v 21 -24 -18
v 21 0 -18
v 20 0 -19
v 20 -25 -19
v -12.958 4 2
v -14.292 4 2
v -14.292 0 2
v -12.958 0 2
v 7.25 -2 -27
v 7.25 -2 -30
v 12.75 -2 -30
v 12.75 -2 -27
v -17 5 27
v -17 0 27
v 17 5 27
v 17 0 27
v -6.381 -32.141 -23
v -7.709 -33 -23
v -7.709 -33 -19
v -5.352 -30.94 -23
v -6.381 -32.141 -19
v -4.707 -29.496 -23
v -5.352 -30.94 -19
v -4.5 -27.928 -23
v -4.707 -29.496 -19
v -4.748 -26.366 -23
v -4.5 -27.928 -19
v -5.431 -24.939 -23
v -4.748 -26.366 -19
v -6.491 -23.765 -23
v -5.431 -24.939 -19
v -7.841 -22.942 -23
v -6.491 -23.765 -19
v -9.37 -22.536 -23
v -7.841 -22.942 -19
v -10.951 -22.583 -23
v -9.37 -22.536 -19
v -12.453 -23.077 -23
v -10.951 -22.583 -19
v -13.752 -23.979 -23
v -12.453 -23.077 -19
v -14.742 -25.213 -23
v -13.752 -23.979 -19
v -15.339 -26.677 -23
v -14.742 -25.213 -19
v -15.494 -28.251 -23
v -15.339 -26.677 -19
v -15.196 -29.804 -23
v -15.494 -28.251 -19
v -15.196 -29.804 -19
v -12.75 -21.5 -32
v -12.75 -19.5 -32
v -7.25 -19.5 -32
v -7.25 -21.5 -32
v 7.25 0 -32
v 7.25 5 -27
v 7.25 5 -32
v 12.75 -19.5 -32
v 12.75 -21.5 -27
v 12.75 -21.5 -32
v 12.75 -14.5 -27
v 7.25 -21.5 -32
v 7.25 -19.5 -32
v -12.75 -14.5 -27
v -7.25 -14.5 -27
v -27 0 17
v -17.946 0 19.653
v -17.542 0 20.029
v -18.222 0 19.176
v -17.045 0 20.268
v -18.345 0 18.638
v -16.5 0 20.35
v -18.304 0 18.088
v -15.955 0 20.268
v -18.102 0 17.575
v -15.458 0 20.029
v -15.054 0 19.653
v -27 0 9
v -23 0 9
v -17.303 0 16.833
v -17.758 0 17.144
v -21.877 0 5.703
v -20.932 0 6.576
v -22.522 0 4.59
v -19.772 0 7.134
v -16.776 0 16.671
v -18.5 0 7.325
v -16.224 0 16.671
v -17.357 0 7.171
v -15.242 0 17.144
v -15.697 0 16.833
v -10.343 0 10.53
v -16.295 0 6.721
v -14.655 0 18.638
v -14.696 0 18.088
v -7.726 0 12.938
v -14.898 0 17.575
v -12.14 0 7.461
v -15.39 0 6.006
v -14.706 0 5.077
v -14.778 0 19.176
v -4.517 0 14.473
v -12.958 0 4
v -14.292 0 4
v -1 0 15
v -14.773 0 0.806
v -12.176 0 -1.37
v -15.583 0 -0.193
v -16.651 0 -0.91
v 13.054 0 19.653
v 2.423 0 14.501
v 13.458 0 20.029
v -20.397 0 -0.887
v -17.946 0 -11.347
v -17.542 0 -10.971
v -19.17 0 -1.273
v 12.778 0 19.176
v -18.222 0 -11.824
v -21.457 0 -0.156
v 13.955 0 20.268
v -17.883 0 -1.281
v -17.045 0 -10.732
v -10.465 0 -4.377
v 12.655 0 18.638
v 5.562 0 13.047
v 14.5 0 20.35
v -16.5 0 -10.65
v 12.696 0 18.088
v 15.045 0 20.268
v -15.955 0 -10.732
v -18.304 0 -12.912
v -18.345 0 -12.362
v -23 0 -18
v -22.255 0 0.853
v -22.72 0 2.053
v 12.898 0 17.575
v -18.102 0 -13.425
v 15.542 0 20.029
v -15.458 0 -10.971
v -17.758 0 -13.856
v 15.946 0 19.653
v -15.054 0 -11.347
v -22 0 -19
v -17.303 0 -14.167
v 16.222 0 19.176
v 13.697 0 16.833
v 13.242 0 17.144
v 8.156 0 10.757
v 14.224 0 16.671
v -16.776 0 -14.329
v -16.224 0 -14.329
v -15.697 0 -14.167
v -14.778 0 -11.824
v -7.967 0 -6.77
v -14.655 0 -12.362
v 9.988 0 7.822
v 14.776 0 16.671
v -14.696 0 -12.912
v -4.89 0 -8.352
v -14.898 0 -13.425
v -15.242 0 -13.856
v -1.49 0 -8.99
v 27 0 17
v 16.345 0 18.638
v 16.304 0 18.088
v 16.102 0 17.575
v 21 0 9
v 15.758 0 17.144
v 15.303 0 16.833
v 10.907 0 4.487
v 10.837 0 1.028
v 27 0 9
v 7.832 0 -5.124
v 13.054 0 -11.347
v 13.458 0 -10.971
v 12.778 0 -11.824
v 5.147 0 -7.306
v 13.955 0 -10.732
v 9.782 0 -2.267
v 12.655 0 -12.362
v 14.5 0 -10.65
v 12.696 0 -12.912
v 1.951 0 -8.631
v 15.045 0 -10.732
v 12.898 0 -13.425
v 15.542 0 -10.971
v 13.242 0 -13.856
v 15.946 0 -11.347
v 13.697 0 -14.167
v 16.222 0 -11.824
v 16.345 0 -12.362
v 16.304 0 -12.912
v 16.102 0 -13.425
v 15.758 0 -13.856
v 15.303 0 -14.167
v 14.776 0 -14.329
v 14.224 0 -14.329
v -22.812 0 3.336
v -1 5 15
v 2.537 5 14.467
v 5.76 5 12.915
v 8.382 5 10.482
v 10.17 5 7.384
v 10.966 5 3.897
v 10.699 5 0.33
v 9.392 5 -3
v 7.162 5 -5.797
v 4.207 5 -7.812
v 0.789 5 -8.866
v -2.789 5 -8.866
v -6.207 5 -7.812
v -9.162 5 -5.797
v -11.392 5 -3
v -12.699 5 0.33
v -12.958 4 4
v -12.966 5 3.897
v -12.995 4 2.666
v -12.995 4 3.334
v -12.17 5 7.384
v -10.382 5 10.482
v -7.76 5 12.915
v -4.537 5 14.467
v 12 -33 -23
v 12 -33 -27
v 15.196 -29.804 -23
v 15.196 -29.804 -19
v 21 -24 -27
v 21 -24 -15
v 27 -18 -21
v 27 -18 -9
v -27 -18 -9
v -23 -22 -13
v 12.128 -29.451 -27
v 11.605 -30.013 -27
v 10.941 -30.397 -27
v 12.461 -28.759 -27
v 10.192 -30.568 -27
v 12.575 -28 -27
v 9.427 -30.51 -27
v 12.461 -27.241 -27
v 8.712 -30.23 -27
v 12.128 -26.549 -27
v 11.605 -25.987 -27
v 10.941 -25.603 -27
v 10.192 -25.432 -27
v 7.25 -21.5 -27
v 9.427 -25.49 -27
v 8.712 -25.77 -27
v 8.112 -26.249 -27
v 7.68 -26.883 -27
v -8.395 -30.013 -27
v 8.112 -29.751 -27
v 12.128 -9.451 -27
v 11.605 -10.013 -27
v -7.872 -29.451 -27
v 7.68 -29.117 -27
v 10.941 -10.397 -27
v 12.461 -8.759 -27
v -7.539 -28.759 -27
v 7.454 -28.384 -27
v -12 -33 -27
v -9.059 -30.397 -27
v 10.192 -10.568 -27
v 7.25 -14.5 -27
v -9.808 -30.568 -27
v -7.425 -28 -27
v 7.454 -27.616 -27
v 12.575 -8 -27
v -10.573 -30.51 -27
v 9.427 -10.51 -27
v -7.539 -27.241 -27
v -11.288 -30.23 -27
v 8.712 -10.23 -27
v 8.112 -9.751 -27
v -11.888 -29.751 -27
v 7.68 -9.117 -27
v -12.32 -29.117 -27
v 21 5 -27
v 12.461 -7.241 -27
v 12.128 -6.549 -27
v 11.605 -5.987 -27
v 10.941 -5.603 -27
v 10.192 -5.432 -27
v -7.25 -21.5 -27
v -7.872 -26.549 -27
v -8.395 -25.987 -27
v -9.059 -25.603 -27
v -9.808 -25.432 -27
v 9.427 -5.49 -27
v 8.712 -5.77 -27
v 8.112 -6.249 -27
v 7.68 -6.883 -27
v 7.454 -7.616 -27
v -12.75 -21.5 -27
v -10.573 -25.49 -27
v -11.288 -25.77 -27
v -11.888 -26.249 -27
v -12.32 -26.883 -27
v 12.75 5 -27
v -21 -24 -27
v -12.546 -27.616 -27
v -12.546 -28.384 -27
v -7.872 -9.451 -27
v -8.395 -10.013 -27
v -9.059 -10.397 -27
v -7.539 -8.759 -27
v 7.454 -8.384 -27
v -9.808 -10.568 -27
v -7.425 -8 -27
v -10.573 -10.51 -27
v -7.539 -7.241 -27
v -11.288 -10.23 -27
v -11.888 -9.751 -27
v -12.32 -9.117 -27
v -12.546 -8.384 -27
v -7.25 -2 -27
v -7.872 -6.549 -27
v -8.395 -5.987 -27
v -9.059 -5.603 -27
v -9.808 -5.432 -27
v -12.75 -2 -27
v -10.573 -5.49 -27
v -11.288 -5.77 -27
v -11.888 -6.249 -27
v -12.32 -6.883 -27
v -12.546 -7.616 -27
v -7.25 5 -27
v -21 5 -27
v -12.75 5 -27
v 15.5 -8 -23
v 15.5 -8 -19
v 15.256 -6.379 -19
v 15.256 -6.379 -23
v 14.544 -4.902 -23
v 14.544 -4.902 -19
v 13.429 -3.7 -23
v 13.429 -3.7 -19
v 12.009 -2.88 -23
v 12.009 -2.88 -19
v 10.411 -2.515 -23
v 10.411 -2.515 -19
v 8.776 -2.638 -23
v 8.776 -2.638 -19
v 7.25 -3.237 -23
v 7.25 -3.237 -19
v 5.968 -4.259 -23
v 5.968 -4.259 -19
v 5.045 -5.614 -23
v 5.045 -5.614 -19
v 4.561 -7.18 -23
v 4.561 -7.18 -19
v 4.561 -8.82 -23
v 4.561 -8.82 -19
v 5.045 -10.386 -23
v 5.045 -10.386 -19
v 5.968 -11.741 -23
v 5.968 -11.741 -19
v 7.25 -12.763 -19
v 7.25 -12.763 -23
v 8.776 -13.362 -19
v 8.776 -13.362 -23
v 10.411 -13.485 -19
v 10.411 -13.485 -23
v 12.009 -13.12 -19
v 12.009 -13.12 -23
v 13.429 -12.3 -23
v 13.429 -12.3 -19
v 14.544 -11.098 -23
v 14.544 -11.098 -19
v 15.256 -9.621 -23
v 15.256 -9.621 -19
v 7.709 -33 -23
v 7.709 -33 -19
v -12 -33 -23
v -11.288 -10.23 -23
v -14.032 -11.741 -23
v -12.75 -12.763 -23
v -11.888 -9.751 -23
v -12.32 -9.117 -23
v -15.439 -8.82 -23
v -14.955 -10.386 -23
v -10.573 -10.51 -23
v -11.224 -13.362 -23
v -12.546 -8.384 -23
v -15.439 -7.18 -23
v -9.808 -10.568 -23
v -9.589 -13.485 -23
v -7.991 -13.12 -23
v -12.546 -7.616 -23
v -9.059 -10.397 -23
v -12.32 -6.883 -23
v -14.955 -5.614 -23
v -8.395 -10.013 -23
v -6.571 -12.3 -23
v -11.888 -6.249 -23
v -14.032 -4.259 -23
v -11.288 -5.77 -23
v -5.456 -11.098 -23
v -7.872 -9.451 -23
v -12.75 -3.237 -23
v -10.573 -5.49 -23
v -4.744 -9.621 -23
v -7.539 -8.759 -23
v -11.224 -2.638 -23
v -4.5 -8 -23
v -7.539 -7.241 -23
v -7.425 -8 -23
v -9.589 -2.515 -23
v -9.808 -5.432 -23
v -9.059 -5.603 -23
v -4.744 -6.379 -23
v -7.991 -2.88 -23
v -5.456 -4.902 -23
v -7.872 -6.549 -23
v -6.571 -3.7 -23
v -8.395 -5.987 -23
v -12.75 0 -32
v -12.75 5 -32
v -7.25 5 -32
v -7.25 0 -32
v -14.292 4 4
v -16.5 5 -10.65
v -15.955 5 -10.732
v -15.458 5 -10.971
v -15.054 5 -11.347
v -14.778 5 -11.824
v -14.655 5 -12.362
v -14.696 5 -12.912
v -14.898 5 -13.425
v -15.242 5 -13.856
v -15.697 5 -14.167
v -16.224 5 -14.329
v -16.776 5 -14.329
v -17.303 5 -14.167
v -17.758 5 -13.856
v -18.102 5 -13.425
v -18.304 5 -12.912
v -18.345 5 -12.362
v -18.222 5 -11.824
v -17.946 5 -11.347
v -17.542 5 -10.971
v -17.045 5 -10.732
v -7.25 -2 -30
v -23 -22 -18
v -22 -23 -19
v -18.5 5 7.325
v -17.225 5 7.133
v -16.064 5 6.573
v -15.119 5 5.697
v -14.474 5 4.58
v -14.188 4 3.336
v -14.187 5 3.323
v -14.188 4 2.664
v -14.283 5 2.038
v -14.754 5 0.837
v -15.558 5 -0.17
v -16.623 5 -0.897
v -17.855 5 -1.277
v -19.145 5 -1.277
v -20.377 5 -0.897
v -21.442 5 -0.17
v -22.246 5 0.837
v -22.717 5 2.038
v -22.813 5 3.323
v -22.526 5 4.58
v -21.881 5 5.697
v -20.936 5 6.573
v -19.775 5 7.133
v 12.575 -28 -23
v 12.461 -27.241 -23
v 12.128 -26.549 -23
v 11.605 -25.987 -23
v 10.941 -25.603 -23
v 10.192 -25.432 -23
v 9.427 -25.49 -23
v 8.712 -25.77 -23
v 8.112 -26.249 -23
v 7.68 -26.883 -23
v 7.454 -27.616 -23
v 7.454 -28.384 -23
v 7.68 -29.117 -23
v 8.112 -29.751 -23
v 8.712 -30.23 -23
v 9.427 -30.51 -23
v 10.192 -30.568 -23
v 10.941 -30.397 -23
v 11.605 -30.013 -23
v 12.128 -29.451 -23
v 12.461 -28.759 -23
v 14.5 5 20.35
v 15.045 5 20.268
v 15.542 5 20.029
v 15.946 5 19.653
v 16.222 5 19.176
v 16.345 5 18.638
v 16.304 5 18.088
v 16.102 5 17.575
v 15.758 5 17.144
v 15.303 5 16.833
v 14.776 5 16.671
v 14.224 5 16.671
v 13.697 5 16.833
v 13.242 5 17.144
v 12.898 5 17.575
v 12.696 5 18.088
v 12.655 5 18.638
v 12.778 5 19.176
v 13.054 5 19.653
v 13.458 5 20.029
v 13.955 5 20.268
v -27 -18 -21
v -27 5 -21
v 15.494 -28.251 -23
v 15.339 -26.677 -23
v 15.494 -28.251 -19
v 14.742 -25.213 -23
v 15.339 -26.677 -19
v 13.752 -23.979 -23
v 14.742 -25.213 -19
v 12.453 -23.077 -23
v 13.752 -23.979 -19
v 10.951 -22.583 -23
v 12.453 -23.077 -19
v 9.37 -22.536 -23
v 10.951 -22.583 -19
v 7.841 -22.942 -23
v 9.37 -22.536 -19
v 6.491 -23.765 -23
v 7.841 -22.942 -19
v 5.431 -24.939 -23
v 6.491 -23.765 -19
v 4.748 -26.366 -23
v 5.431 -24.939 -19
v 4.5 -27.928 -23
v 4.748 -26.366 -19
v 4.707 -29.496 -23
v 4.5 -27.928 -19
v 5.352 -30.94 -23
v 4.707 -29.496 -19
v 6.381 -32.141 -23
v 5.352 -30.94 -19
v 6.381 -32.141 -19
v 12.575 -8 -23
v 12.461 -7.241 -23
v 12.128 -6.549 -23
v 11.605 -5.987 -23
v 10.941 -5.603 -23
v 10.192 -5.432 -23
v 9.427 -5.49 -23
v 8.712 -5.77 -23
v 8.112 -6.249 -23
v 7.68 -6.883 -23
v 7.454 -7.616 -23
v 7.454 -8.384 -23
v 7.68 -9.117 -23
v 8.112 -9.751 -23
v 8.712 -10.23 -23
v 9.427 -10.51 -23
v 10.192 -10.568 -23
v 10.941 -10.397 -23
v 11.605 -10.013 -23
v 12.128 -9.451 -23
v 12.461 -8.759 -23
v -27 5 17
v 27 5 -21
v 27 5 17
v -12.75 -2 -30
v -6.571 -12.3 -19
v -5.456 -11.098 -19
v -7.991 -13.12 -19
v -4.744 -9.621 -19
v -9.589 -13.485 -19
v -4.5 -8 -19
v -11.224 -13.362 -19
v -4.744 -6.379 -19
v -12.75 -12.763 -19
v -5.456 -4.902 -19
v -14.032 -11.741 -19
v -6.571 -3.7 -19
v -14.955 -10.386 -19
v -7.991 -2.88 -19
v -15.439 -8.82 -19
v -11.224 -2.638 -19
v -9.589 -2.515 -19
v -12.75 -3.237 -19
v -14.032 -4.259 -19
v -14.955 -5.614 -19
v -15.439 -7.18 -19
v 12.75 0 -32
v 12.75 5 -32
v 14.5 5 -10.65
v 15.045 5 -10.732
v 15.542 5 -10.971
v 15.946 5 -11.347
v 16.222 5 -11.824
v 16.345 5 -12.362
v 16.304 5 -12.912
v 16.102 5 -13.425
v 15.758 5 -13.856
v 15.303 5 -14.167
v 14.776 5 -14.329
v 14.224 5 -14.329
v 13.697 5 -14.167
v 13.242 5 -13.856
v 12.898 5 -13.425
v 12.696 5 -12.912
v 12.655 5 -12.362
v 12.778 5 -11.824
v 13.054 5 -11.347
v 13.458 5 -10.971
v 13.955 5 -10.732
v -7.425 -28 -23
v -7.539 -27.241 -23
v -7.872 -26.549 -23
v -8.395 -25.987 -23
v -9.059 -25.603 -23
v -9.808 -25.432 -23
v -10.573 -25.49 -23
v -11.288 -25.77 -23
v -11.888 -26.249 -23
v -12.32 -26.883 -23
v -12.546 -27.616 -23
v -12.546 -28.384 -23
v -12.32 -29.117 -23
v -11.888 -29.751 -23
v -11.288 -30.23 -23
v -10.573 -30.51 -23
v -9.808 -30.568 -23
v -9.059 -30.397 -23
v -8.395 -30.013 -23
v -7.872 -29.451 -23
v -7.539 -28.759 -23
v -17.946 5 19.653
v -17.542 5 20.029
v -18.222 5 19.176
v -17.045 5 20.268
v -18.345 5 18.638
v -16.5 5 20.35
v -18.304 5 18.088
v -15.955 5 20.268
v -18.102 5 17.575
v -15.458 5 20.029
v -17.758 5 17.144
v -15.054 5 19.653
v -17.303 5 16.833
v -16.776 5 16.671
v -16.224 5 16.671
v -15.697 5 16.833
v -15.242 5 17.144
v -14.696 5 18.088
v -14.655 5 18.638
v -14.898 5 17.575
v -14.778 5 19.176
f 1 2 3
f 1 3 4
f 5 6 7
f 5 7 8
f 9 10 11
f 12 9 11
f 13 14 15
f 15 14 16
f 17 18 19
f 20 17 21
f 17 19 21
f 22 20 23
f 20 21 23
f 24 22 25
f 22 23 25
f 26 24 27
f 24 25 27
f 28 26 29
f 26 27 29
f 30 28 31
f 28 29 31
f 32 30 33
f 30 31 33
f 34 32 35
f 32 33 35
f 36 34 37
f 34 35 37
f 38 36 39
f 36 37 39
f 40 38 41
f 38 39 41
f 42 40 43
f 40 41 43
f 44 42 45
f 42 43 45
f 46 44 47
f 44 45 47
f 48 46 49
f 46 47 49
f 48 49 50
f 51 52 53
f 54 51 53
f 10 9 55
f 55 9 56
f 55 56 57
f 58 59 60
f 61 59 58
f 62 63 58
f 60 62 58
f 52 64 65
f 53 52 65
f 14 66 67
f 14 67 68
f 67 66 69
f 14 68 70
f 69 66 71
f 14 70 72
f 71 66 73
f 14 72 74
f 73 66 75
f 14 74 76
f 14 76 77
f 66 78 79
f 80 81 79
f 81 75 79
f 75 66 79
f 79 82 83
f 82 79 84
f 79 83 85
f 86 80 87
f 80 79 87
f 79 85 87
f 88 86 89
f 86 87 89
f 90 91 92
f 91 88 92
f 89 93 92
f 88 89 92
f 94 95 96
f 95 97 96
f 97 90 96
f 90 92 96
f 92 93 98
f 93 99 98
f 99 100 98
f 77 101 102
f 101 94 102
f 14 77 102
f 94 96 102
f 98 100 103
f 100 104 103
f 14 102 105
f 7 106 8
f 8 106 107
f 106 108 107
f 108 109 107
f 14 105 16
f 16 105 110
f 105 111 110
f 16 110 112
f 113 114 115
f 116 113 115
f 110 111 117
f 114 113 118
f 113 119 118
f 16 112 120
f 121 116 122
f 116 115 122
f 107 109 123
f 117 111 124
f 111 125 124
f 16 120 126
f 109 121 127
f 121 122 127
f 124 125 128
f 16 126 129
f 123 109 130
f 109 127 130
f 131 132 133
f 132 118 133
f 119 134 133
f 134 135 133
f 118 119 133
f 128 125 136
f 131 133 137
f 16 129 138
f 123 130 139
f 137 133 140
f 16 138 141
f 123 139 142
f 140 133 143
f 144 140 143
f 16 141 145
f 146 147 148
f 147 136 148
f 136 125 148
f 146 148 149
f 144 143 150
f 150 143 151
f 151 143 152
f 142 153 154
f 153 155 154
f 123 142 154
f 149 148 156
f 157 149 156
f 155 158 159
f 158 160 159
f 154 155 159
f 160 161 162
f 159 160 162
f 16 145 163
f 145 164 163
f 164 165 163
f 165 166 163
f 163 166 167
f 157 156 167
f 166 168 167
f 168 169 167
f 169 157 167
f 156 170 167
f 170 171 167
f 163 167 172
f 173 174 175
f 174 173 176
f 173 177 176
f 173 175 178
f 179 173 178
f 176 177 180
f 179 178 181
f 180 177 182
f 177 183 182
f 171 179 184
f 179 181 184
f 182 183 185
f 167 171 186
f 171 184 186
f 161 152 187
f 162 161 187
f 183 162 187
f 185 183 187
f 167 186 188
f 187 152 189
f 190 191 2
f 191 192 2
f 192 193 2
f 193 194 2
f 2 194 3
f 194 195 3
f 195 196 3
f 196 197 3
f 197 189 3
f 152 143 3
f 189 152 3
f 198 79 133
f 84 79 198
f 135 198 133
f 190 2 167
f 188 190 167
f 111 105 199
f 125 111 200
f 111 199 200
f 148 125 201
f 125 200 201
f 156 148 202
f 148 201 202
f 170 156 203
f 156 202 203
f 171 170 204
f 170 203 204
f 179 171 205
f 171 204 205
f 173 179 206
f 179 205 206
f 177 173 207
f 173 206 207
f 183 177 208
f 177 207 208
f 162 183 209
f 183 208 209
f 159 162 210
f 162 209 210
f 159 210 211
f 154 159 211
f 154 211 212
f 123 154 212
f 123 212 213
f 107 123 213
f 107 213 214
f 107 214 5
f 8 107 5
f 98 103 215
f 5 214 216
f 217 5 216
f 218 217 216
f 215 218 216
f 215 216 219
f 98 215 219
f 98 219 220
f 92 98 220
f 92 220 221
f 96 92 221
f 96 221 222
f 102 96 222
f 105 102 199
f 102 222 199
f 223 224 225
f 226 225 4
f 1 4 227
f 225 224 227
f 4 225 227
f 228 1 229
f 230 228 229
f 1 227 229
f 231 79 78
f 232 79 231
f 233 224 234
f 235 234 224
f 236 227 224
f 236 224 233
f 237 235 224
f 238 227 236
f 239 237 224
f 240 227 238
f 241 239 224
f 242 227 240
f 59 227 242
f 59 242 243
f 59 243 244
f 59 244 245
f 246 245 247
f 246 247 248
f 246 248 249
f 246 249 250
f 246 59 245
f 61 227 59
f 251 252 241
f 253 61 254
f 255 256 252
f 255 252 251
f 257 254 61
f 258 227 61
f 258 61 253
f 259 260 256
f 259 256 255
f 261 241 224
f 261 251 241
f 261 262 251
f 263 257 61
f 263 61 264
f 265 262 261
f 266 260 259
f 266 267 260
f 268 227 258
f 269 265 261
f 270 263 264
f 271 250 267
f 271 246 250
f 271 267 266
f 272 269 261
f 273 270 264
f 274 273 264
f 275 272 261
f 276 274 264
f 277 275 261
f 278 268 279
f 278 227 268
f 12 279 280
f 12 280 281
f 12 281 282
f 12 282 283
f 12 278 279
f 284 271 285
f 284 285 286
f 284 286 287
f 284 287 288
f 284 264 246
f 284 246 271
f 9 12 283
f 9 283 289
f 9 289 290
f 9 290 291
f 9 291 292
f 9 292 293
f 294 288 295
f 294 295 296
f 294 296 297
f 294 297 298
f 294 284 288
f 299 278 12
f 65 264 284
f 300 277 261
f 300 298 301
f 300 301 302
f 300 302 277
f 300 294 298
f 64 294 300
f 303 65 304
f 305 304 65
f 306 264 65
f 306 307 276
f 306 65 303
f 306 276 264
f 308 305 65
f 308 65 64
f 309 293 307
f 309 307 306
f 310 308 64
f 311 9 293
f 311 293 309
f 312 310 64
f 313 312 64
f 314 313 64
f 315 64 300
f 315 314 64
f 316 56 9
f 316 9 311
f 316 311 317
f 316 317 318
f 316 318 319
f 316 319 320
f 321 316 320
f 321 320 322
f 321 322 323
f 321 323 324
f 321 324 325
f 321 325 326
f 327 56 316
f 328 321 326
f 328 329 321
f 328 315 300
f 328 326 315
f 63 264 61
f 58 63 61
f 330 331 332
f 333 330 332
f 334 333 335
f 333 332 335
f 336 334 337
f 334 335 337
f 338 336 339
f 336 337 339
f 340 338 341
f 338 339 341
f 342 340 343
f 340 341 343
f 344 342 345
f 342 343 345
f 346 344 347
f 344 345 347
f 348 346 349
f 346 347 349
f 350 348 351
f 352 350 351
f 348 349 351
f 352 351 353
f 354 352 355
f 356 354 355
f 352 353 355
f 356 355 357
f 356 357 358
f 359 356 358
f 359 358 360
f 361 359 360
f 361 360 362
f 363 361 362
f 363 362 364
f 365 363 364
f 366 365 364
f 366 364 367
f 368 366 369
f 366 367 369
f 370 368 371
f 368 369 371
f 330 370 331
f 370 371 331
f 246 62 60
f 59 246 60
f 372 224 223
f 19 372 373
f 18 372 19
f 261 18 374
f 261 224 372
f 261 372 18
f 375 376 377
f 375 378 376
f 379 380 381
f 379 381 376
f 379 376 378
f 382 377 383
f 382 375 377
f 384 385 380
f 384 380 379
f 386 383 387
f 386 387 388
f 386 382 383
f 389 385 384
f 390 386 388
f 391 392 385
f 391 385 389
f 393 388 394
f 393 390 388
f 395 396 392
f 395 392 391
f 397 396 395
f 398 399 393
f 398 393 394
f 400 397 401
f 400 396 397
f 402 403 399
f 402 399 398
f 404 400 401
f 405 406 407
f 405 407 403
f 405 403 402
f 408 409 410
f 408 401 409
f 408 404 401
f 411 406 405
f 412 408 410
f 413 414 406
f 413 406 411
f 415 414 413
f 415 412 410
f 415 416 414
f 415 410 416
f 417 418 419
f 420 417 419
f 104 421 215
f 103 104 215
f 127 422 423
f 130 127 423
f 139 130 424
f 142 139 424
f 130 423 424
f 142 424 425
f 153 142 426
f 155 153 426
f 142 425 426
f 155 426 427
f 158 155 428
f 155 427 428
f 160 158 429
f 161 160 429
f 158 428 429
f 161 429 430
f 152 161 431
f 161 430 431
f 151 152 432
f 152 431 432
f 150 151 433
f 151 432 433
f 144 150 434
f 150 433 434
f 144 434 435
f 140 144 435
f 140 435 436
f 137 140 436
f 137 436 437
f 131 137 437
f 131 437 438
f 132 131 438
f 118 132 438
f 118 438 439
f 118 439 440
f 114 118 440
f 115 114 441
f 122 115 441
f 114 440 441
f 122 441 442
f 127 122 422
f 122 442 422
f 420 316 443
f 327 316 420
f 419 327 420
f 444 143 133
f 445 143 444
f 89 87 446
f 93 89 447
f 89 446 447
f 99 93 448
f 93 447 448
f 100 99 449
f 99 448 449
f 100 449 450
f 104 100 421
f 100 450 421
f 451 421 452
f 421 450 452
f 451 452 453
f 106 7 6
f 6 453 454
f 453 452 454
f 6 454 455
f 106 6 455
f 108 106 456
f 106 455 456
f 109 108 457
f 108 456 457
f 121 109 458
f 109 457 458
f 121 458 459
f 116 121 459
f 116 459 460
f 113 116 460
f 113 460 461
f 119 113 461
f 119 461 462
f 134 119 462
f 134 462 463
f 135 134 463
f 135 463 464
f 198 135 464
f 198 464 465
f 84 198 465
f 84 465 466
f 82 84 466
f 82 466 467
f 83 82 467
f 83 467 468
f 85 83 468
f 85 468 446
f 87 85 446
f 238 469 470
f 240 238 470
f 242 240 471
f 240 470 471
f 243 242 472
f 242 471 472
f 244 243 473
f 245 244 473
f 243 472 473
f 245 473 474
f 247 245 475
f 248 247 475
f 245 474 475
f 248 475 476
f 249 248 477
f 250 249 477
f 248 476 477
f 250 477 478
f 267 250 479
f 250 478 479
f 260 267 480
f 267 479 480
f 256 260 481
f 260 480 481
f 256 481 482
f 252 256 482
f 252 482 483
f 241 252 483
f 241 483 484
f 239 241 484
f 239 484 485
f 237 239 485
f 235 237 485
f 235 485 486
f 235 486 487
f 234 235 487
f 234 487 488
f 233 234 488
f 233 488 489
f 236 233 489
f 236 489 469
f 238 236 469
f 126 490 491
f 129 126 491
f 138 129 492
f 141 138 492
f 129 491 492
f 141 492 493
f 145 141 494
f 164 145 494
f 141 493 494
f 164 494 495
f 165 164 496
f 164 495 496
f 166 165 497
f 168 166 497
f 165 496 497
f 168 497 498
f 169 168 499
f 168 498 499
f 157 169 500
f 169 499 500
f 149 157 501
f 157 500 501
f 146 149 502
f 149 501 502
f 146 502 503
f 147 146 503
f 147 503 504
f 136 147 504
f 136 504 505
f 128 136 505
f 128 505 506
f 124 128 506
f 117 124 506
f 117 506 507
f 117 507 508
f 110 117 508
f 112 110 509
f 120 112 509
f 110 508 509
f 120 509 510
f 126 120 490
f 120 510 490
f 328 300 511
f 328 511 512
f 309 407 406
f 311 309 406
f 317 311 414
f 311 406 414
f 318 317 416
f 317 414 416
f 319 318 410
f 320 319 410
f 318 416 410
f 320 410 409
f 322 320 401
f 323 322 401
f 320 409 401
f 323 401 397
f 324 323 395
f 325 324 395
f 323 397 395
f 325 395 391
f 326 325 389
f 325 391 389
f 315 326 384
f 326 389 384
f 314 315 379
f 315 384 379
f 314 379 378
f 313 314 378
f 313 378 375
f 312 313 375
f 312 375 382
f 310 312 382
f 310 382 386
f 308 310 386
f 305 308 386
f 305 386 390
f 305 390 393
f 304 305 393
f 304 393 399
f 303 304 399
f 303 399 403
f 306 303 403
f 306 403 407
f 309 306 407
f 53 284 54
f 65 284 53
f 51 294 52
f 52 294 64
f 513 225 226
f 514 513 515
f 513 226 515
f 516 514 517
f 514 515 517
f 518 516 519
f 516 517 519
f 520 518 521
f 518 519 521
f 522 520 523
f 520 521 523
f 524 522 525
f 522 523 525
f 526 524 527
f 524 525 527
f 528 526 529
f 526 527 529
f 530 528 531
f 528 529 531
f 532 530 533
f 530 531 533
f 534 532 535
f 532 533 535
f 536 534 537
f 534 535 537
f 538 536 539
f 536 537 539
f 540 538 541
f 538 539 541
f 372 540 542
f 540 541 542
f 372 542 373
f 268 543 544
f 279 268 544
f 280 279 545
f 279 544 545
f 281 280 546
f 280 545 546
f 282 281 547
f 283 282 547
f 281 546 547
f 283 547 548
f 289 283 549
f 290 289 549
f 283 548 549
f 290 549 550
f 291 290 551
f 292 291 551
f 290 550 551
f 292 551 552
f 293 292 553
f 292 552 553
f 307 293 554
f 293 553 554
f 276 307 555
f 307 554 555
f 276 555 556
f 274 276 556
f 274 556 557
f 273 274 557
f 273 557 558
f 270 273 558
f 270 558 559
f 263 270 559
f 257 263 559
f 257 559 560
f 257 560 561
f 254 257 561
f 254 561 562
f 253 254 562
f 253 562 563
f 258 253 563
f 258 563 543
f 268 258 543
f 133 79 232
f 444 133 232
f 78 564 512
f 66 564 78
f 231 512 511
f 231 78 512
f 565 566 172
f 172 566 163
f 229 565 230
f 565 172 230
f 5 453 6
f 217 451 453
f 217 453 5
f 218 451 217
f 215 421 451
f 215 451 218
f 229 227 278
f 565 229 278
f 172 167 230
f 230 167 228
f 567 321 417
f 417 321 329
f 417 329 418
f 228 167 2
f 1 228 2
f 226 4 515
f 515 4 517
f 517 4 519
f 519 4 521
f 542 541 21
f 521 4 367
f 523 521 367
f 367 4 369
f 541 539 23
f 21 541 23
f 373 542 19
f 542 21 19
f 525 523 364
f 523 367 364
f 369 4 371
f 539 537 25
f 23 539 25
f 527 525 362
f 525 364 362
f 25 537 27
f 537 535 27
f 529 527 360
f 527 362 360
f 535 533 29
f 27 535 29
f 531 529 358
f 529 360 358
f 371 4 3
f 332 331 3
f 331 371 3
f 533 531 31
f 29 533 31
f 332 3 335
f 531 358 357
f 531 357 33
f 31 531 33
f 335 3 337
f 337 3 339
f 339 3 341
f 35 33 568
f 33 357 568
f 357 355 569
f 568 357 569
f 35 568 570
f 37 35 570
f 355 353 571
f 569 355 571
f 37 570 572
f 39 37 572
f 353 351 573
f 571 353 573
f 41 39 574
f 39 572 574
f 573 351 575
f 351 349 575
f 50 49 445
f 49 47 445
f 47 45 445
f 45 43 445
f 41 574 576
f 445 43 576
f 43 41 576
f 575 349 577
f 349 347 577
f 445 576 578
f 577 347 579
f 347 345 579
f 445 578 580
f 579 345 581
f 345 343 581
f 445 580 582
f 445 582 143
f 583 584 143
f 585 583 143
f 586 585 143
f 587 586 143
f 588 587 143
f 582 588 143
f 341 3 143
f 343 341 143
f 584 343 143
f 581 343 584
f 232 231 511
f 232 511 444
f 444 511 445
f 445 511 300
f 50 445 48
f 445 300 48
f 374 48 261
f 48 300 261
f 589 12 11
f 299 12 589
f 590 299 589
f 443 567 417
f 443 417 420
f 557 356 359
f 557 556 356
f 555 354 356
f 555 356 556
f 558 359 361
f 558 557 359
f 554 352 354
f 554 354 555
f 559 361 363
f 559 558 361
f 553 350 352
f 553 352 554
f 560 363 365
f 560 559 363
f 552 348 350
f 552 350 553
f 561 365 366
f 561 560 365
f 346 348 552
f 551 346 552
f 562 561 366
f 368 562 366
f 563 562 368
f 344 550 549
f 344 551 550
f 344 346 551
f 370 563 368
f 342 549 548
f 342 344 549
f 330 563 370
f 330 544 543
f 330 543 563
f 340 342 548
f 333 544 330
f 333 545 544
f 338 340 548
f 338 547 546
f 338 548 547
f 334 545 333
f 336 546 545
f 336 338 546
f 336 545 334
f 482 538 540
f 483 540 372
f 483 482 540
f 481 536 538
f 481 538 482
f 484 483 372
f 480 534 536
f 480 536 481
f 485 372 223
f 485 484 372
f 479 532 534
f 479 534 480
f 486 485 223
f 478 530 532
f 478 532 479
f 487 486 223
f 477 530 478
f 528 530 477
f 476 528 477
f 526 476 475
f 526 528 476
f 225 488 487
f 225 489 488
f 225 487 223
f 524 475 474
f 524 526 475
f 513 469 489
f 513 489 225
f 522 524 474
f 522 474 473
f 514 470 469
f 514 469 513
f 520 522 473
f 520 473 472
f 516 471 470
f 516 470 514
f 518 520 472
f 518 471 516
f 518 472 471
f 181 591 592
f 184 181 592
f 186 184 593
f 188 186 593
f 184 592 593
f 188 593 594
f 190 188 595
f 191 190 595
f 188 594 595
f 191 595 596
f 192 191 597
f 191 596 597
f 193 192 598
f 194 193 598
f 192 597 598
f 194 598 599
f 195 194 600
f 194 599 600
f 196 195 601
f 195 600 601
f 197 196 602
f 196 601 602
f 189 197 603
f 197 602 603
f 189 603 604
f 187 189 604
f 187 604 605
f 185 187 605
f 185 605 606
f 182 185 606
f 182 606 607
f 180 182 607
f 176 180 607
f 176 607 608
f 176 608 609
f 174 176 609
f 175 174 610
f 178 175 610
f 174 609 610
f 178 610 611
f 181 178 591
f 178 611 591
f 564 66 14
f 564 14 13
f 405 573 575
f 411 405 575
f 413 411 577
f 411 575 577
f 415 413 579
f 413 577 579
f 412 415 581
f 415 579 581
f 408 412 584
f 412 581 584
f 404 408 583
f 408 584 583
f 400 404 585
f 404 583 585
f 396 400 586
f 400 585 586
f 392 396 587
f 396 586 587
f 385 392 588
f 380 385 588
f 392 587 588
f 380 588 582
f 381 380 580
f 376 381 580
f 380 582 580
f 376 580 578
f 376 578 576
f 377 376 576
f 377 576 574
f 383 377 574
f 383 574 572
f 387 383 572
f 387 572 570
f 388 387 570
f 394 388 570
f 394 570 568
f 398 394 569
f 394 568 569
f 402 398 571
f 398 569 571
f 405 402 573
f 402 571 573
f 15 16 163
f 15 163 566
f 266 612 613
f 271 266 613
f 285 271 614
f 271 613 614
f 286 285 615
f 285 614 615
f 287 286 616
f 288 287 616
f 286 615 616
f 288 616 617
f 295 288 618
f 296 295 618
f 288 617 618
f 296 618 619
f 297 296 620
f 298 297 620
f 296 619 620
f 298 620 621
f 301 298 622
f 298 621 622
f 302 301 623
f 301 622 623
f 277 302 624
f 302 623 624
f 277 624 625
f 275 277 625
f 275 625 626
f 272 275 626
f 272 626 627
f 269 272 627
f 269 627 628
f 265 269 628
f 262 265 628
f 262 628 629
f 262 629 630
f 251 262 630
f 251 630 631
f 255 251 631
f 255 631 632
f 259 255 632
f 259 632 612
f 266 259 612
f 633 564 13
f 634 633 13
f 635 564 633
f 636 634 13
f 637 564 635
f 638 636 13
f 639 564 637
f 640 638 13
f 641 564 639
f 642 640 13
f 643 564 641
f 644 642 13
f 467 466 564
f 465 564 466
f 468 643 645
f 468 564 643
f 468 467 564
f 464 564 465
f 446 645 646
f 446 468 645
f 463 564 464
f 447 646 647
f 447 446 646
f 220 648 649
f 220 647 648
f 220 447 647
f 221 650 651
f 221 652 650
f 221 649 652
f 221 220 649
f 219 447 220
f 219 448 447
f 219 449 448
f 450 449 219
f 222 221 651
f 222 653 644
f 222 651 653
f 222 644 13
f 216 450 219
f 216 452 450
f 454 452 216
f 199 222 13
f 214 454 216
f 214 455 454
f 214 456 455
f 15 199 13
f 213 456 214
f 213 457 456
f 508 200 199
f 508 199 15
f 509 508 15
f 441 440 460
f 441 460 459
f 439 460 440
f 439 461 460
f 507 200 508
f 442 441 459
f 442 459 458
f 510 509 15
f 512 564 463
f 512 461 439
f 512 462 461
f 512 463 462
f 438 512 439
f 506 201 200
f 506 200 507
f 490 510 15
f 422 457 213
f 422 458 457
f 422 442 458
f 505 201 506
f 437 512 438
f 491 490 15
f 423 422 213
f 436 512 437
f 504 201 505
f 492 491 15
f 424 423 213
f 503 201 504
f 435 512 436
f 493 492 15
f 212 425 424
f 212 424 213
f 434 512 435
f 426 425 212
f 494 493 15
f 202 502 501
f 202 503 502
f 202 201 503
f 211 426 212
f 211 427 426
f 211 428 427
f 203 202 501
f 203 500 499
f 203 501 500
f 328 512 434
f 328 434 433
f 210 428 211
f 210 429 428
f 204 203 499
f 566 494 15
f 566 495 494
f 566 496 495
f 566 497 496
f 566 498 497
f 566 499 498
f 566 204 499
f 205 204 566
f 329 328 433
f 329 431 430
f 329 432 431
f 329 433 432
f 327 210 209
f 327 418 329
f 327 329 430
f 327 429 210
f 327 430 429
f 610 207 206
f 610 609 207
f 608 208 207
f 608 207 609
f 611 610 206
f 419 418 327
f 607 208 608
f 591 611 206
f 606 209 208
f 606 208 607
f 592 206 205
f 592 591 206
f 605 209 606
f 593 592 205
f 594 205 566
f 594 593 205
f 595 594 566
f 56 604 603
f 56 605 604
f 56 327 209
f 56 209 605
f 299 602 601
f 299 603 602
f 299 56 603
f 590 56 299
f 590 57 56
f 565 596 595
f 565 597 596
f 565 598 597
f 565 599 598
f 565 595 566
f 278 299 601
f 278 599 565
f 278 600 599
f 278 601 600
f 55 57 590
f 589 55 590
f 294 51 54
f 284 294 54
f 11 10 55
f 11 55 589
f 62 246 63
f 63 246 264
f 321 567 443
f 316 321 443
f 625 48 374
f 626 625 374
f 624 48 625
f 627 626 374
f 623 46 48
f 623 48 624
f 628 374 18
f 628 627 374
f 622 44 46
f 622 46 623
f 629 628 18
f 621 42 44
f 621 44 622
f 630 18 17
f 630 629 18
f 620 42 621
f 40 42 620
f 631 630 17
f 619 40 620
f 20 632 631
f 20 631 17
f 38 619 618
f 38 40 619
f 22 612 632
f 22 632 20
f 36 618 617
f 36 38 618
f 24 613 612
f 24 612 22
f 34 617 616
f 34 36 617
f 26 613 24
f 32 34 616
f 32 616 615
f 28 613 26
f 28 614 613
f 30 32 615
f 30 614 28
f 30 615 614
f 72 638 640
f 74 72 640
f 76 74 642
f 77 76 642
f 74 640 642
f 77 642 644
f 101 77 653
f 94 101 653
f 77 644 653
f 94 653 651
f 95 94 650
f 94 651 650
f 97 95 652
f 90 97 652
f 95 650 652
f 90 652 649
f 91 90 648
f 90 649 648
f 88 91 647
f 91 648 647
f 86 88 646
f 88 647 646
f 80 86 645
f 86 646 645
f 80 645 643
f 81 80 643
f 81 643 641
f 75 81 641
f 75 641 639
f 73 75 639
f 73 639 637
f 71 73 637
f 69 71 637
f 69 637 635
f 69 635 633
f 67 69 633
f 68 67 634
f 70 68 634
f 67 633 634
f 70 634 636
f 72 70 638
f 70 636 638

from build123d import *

# Parameters (mm, degrees)
SKETCH1_W           = 54
SKETCH1_H           = 54
BOSS_EXTRUDE1_DEPTH = 5
SKETCH3_W           = 54
SKETCH3_H           = 38
BOSS_EXTRUDE2_DEPTH = 8
SKETCH9_W           = 5.5
SKETCH9_H           = 5
BOSS_EXTRUDE3_DEPTH = 7
SKETCH2_R           = 12
SKETCH2_R_2         = 4.325
SKETCH2_R_3         = 1.85
CUT_EXTRUDE1_DEPTH  = 5
SKETCH4_R           = 2.575
CUT_EXTRUDE2_DEPTH  = 8
SKETCH7_R           = 5.5
CUT_EXTRUDE3_DEPTH  = 4
SKETCH8_W           = 4.486421388
SKETCH8_H           = 2
CUT_EXTRUDE4_DEPTH  = 4
RIB1_REACH          = 72.915
SKETCH5_WALL_W      = 183.428864958
SKETCH5_WALL_H      = 4
RIB9_REACH          = 72.915
SKETCH6_WALL_W      = 183.428864958
SKETCH6_WALL_H      = 6
CHAMFER1_SIZE       = 10
CHAMFER2_SIZE       = 15
CHAMFER3_SIZE       = 15
CHAMFER4_SIZE       = 1
CHAMFER6_SIZE       = 6
LPATTERN2_COUNT     = 2
LPATTERN2_PITCH     = 19.5
CHAMFER7_SIZE       = 2
CHAMFER8_SIZE       = 5


# Some blends are built 0.0001 mm under size
with BuildPart() as part:
    # Sketch1 → Boss-Extrude1 (new body)
    with BuildSketch(Plane(origin=(0, 0, 0), x_dir=(1, 0, 0), z_dir=(0, 1, 0))):
        Rectangle(SKETCH1_W, SKETCH1_H)
    extrude(amount=BOSS_EXTRUDE1_DEPTH)

    # Sketch3 → Boss-Extrude2 (add)
    with BuildSketch(Plane(origin=(0, 0, -27), x_dir=(-1, 0, 0), z_dir=(0, 0, -1))):
        with Locations((0, -14)):
            Rectangle(SKETCH3_W, SKETCH3_H)
    extrude(amount=-BOSS_EXTRUDE2_DEPTH)

    # Sketch9 → Boss-Extrude3 (add)
    with BuildSketch(Plane(origin=(0, 5, 0), x_dir=(1, 0, 0), z_dir=(0, 1, 0))):
        with Locations((10, 29.5)):
            Rectangle(SKETCH9_W, SKETCH9_H)
        with Locations((-10, 29.5)):
            Rectangle(SKETCH9_W, SKETCH9_H)
    boss_extrude3 = extrude(amount=-BOSS_EXTRUDE3_DEPTH)

    # Sketch2 → Cut-Extrude1 (cut)
    with BuildSketch(Plane(origin=(0, 5, 0), x_dir=(1, 0, 0), z_dir=(0, 1, 0))):
        with Locations(Location((-1, -3, 0), (0, 0, 270))):
            Circle(SKETCH2_R)
        with Locations(Location((-18.5, -3, 0), (0, 0, 270))):
            Circle(SKETCH2_R_2)
        with Locations(Location((14.5, 12.5, 0), (0, 0, 270))):
            Circle(SKETCH2_R_3)
        with Locations(Location((-16.5, 12.5, 0), (0, 0, 270))):
            Circle(SKETCH2_R_3)
        with Locations(Location((-16.5, -18.5, 0), (0, 0, 270))):
            Circle(SKETCH2_R_3)
        with Locations(Location((14.5, -18.5, 0), (0, 0, 270))):
            Circle(SKETCH2_R_3)
    extrude(amount=-CUT_EXTRUDE1_DEPTH, mode=Mode.SUBTRACT)

    # Sketch4 → Cut-Extrude2 (cut)
    with BuildSketch(Plane.XY.offset(-19)):
        with Locations((-10, -8)):
            Circle(SKETCH4_R)
        with Locations((10, -8)):
            Circle(SKETCH4_R)
        with Locations((10, -28)):
            Circle(SKETCH4_R)
        with Locations((-10, -28)):
            Circle(SKETCH4_R)
    extrude(amount=-CUT_EXTRUDE2_DEPTH, mode=Mode.SUBTRACT)

    # Sketch7 → Cut-Extrude3 (cut)
    with BuildSketch(Plane.XY.offset(-19)):
        with Locations((-10, -8)):
            Circle(SKETCH7_R)
        with Locations((10, -8)):
            Circle(SKETCH7_R)
        with Locations((10, -28)):
            Circle(SKETCH7_R)
        with Locations((-10, -28)):
            Circle(SKETCH7_R)
    extrude(amount=-CUT_EXTRUDE3_DEPTH, mode=Mode.SUBTRACT)

    # Sketch8 → Cut-Extrude4 (cut)
    with BuildSketch(Plane.XZ):
        with Locations((-13.778117046, 3)):
            Rectangle(SKETCH8_W, SKETCH8_H)
    extrude(amount=-CUT_EXTRUDE4_DEPTH, mode=Mode.SUBTRACT)

    # Sketch5 wall → Rib1 (add, up to next)
    with BuildSketch(Plane(origin=(-27, -14, -5), x_dir=(0, -0.707106781187, -0.707106781187), z_dir=(0, -0.707106781187, 0.707106781187)), mode=Mode.PRIVATE) as rib1_sk1:
        with Locations((0, 2)):
            Rectangle(SKETCH5_WALL_W, SKETCH5_WALL_H)
    rib1_tool1 = extrude(rib1_sk1.sketch, amount=-RIB1_REACH, mode=Mode.PRIVATE) - part.part
    add(rib1_tool1.solids().sort_by_distance((-27, -14, -5))[0])

    # Sketch6 wall → Rib9 (add, up to next)
    with BuildSketch(Plane(origin=(27, -14, -5), x_dir=(0, -0.707106781187, -0.707106781187), z_dir=(0, 0.707106781187, -0.707106781187)), mode=Mode.PRIVATE) as rib9_sk1:
        with Locations((0, 3)):
            Rectangle(SKETCH6_WALL_W, SKETCH6_WALL_H)
    rib9_tool1 = extrude(rib9_sk1.sketch, amount=RIB9_REACH, mode=Mode.PRIVATE) - part.part
    add(rib9_tool1.solids().sort_by_distance((27, -14, -5))[0])

    # Chamfer1
    chamfer1_edges = [part.edges().sort_by_distance(p)[0] for p in [
        (27, 2.5, 27),
        (-27, 2.5, 27),
    ]]
    chamfer(chamfer1_edges, length=CHAMFER1_SIZE)

    # Chamfer2
    # the kernel refuses this chamfer: 15 mm, written as the material it takes off along each edge
    with BuildSketch(Plane(origin=(27, -33, -65.575244819), x_dir=(-0.9996219169112968, -0.02749587661058632, 0), z_dir=(0, 0, 1))) as chamfer2_piece_1:
        Polygon((CHAMFER2_SIZE * 0.999621916911, -CHAMFER2_SIZE * 0.0274958766106), (-CHAMFER2_SIZE * 0.0274958766106, -CHAMFER2_SIZE * 0.999621916911), (0, 0), align=None)
    extrude(amount=85.150489639, mode=Mode.SUBTRACT)

    # Chamfer3
    # the kernel refuses this chamfer: 15 mm, written as the material it takes off along each edge
    with BuildSketch(Plane(origin=(-27, -33, -65.575244819), x_dir=(-0.02749587661058632, 0.9996219169112968, 0), z_dir=(0, 0, 1))) as chamfer3_piece_1:
        Polygon((CHAMFER3_SIZE * 0.999621916911, -CHAMFER3_SIZE * 0.0274958766106), (-CHAMFER3_SIZE * 0.0274958766106, -CHAMFER3_SIZE * 0.999621916911), (0, 0), align=None)
    extrude(amount=85.150489639, mode=Mode.SUBTRACT)

    # Chamfer4
    chamfer4_edges = [part.edges().sort_by_distance(p)[0] for p in [
        (21, -12, -19),
        (-23, -11, -19),
    ]]
    chamfer(chamfer4_edges, length=CHAMFER4_SIZE)

    # Chamfer6
    chamfer6_edges = [part.edges().sort_by_distance(p)[0] for p in [
        (-27, -6.5, -27),
        (27, -6.5, -27),
    ]]
    chamfer(chamfer6_edges, length=CHAMFER6_SIZE)

    # LPattern2: Boss-Extrude3 ×2
    with Locations(*[(0, -i * LPATTERN2_PITCH, 0) for i in range(1, LPATTERN2_COUNT)]):
        add(boss_extrude3)

    # Chamfer7
    chamfer7_edges = [part.edges().sort_by_distance(p)[0] for p in [
        (10, -2, -32),
        (-10, -2, -32),
    ]]
    chamfer(chamfer7_edges, length=CHAMFER7_SIZE)

    # Chamfer8
    chamfer8_edges = [part.edges().sort_by_distance(p)[0] for p in [
        (10, -14.5, -32),
        (-10, -14.5, -32),
    ]]
    chamfer(chamfer8_edges, length=CHAMFER8_SIZE - 0.0001)  # a hair under: the kernel refuses the full size


solid = part.part
